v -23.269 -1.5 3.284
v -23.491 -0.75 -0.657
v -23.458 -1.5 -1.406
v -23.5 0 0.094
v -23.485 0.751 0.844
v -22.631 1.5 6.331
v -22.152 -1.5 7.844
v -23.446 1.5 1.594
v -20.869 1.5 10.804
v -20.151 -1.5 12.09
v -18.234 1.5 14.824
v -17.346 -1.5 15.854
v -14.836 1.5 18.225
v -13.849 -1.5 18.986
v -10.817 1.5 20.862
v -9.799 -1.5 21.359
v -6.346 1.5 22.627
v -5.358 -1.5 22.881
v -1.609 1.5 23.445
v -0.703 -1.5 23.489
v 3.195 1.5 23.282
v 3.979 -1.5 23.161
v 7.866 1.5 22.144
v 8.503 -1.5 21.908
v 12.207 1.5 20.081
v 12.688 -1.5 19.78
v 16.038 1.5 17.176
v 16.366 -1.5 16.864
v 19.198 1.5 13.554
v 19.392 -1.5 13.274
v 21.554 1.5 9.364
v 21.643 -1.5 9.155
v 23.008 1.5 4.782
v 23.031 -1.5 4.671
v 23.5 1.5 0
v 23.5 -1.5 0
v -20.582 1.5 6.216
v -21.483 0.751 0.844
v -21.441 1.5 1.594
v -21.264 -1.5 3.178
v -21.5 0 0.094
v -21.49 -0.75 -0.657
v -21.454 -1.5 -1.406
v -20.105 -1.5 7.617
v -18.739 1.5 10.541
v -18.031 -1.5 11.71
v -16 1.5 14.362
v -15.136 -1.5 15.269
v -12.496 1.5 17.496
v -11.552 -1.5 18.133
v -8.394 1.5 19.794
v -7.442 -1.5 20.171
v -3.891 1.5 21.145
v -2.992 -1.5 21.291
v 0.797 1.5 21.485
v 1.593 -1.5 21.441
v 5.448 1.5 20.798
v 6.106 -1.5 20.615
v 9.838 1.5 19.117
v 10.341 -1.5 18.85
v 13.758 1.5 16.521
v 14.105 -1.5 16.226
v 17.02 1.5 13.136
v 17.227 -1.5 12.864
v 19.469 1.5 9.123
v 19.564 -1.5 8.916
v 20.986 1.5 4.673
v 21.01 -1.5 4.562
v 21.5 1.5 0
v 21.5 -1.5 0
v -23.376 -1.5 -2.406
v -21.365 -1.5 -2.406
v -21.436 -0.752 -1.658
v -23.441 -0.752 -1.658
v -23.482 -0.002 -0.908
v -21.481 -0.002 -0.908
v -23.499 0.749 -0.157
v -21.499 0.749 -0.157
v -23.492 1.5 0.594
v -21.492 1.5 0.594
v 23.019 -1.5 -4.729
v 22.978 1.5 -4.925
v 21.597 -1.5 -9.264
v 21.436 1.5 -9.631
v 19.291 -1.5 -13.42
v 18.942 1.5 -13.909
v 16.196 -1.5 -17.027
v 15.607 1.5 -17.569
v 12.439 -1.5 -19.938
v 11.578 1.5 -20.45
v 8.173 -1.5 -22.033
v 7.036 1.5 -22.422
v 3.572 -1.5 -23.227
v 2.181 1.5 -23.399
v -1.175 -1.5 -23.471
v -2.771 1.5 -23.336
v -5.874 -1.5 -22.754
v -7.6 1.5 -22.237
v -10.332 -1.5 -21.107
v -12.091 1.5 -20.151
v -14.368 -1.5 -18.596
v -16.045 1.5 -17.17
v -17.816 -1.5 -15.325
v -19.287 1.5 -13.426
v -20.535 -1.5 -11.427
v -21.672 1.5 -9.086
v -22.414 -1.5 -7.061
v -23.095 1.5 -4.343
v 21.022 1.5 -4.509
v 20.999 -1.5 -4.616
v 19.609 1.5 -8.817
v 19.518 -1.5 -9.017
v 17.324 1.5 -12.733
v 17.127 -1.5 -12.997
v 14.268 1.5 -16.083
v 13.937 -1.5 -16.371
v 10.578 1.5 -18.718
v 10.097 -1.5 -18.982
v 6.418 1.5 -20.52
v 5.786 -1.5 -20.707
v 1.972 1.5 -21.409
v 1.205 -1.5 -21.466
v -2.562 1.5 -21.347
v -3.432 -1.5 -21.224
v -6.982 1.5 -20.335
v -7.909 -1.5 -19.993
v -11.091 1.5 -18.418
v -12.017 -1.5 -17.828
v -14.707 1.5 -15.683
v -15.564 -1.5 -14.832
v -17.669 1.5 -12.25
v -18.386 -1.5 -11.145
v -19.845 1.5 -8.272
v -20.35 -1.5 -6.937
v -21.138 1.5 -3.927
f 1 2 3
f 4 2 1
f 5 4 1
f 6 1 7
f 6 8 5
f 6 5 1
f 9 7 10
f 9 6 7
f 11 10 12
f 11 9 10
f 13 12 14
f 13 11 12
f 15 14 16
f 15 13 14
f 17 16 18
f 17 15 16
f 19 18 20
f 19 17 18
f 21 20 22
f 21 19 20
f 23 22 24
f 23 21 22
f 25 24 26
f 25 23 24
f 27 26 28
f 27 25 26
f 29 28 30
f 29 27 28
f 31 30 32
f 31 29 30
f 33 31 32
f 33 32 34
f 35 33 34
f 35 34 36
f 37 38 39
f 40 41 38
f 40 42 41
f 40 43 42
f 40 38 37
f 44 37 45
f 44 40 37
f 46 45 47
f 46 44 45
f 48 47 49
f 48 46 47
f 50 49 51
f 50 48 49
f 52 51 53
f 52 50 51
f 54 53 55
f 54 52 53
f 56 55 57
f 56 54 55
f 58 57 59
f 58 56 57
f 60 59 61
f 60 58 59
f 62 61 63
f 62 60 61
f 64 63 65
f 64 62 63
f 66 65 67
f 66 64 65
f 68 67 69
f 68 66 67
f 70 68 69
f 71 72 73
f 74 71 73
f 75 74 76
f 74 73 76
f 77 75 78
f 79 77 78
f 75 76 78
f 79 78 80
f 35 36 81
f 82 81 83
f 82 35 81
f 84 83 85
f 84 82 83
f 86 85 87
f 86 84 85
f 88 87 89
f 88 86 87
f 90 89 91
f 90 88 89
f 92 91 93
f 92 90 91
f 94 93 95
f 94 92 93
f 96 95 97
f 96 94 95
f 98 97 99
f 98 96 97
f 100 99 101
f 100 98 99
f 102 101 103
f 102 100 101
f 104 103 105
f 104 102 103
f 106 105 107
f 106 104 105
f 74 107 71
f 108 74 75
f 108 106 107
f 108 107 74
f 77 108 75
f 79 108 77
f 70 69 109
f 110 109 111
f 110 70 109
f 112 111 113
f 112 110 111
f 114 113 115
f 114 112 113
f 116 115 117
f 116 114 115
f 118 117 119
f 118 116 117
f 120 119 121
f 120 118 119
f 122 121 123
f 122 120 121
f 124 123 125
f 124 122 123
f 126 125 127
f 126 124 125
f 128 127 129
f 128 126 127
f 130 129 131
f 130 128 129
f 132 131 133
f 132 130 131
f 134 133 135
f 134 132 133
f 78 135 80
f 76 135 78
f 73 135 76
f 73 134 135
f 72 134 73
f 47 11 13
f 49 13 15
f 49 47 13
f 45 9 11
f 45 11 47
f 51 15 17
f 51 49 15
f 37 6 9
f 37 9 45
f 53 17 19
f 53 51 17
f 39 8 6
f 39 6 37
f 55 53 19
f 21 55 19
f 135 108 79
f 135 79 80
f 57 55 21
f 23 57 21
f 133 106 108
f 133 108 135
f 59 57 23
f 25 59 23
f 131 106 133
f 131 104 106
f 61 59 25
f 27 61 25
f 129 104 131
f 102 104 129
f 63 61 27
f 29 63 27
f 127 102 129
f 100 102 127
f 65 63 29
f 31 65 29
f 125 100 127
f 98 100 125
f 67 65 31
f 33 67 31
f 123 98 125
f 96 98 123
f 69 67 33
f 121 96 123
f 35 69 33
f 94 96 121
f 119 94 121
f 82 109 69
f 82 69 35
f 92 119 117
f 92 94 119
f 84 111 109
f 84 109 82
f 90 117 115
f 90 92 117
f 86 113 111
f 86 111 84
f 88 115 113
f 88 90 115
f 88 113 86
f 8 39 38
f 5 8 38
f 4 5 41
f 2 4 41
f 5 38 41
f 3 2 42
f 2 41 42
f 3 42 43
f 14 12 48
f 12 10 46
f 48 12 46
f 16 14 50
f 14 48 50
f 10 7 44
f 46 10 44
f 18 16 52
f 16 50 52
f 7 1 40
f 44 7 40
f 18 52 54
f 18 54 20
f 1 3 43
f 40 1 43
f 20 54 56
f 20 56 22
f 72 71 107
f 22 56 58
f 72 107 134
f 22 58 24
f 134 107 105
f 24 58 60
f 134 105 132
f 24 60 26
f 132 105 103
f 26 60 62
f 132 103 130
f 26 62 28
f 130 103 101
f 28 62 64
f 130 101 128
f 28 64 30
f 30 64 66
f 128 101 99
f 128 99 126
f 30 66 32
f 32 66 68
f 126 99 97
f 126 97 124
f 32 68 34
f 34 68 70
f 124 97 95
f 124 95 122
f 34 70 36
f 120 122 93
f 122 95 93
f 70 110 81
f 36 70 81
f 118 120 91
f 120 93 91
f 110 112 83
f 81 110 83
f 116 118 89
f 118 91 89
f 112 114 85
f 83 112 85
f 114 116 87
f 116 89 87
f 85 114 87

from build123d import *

# Parameters (mm, degrees)
SKETCH1_R           = 23.5
SKETCH1_R_2         = 21.5
BOSS_EXTRUDE1_DEPTH = 1.5
CUT_EXTRUDE1_REACH  = 25.5


with BuildPart() as part:
    # Sketch1 → Boss-Extrude1 (new body, symmetric)
    with BuildSketch(Plane(origin=(0, 0, 0), x_dir=(1, 0, 0), z_dir=(0, 1, 0))):
        Circle(SKETCH1_R)
        Circle(SKETCH1_R_2, mode=Mode.SUBTRACT)
    extrude(amount=BOSS_EXTRUDE1_DEPTH, both=True)

    # Sketch2 → Cut-Extrude1 (cut, up to next)
    with BuildSketch(Plane(origin=(0, 0, 0), x_dir=(0, 0, -1), z_dir=(1, 0, 0)), mode=Mode.PRIVATE) as cut_extrude1_sk1:
        Polygon((-1.593721188, 1.5), (1.406278812, -1.5), (2.406278812, -1.5), (-0.593721188, 1.5), align=None)
    cut_extrude1_tool1 = extrude(cut_extrude1_sk1.sketch, amount=-CUT_EXTRUDE1_REACH, mode=Mode.PRIVATE) & part.part
    add(cut_extrude1_tool1.solids().sort_by_distance((0, 0, -0.406279))[0], mode=Mode.SUBTRACT)


solid = part.part
